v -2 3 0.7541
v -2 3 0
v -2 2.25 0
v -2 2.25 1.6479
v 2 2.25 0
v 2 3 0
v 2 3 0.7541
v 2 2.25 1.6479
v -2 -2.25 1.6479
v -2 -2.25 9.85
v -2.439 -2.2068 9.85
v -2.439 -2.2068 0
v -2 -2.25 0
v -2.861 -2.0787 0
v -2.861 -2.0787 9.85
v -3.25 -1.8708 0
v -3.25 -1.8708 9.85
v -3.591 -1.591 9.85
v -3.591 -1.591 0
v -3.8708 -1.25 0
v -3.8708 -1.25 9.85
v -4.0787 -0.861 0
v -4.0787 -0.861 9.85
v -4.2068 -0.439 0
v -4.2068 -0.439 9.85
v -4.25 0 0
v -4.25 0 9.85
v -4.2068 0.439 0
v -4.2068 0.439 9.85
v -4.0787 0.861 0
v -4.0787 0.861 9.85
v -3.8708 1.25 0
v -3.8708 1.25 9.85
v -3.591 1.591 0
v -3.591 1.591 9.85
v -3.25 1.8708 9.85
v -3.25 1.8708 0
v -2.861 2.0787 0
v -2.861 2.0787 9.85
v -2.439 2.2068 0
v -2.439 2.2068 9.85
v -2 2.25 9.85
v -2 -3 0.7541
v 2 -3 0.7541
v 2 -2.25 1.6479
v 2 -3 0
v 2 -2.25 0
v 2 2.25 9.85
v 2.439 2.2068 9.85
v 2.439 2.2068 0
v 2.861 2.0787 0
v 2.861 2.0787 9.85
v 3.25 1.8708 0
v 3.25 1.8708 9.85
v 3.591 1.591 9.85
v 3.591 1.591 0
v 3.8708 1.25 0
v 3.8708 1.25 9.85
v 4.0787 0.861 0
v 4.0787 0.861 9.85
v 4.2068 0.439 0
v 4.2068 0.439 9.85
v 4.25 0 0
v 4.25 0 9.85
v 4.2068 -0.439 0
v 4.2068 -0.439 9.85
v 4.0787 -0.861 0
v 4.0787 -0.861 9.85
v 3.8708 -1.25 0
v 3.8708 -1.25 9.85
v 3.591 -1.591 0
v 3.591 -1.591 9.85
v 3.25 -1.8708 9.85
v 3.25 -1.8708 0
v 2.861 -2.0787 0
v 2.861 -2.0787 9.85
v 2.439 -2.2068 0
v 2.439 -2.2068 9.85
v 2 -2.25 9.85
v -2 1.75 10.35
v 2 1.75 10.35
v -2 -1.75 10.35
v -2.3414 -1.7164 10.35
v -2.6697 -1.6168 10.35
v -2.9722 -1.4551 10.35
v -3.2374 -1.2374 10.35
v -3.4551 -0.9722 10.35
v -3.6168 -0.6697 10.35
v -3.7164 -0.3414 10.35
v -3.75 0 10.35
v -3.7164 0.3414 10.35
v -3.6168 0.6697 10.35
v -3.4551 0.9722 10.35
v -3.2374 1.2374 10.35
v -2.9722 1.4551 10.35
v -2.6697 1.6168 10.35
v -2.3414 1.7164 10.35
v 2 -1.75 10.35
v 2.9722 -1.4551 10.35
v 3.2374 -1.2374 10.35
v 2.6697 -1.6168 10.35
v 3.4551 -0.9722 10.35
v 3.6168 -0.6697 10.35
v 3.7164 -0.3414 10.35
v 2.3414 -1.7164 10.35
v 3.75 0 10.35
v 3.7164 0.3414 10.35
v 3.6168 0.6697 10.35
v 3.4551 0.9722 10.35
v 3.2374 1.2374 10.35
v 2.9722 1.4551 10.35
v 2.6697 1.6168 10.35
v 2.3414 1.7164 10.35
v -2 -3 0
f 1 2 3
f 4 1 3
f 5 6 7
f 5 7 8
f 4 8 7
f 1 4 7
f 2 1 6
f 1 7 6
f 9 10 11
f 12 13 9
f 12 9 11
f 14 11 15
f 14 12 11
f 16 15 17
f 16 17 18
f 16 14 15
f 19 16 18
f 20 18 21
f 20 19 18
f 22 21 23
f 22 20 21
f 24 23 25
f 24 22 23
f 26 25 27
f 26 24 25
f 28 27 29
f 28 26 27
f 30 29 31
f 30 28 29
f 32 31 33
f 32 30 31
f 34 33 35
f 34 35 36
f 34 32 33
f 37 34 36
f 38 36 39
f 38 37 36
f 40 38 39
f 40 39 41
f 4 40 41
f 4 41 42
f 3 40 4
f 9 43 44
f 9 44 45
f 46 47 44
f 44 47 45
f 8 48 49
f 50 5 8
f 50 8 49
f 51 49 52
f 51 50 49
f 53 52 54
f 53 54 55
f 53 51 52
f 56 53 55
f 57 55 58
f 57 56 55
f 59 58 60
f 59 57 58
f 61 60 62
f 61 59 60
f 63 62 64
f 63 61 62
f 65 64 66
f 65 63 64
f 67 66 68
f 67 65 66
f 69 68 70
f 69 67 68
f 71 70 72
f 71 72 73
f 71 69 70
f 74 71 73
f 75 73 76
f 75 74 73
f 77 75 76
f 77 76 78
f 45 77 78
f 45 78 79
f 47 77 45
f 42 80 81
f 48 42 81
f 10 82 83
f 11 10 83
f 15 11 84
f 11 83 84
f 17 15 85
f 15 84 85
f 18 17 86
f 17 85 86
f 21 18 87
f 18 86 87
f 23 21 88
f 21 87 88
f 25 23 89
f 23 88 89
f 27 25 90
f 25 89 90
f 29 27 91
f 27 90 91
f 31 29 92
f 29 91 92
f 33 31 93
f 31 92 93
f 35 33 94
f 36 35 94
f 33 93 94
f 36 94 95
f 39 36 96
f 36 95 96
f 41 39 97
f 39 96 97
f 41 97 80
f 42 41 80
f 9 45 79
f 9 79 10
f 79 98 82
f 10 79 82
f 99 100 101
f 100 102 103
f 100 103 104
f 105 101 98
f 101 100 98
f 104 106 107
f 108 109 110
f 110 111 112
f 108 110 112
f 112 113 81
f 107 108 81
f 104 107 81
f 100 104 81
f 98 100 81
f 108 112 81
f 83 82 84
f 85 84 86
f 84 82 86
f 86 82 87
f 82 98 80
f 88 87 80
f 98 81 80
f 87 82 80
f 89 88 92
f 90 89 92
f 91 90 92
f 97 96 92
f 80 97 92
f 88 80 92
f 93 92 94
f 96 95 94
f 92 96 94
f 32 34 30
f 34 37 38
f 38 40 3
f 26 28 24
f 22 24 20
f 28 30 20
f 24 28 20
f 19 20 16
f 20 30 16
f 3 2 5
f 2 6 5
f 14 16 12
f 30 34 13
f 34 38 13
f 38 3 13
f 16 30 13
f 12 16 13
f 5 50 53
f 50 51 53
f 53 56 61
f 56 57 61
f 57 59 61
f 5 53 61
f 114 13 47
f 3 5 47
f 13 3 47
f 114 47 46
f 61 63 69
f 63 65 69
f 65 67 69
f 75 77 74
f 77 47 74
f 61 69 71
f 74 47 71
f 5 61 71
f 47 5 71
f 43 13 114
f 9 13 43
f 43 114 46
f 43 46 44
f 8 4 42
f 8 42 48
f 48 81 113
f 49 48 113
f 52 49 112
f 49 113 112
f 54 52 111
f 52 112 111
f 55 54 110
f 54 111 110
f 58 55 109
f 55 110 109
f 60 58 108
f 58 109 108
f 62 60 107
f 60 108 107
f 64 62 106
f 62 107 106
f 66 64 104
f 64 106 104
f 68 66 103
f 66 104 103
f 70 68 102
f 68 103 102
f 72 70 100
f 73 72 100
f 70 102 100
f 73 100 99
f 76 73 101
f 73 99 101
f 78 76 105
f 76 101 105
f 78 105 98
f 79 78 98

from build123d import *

# Parameters (mm, degrees)
BOSS_EXTRUDE1_DEPTH      = 10.35
BOSS_EXTRUDE2_DEPTH      = 2
BOSS_EXTRUDE2_DEPTH_BACK = 2
CHAMFER1_SIZE            = 0.5


with BuildPart() as part:
    # Sketch2 → Boss-Extrude1 (new body)
    with BuildSketch(Plane.XY):
        with BuildLine():
            Line((-2, 2.25), (2, 2.25))
            ThreePointArc((2, 2.25), (4.25, 0), (2, -2.25))
            Line((2, -2.25), (-2, -2.25))
            ThreePointArc((-2, -2.25), (-4.25, 0), (-2, 2.25))
        make_face()
    extrude(amount=BOSS_EXTRUDE1_DEPTH)

    # Sketch5 → Boss-Extrude2 (add, two sides)
    with BuildSketch(Plane(origin=(0, 0, 0), x_dir=(0, 0, -1), z_dir=(1, 0, 0))) as boss_extrude2_sk:
        Polygon((-1.647938398, 2.25), (-0.754123204, 3), (0, 3), (0, 2.25), align=None)
        Polygon((-1.647938398, -2.25), (0, -2.25), (0, -3), (-0.754123204, -3), align=None)
    extrude(amount=BOSS_EXTRUDE2_DEPTH)
    extrude(boss_extrude2_sk.sketch, amount=-BOSS_EXTRUDE2_DEPTH_BACK)

    # Chamfer1
    chamfer1_edges = [part.edges().sort_by_distance(p)[0] for p in [
        (4.25, 0, 10.35),
        (0, 2.25, 10.35),
        (-4.25, 0, 10.35),
        (0, -2.25, 10.35),
    ]]
    chamfer(chamfer1_edges, length=CHAMFER1_SIZE)


solid = part.part
